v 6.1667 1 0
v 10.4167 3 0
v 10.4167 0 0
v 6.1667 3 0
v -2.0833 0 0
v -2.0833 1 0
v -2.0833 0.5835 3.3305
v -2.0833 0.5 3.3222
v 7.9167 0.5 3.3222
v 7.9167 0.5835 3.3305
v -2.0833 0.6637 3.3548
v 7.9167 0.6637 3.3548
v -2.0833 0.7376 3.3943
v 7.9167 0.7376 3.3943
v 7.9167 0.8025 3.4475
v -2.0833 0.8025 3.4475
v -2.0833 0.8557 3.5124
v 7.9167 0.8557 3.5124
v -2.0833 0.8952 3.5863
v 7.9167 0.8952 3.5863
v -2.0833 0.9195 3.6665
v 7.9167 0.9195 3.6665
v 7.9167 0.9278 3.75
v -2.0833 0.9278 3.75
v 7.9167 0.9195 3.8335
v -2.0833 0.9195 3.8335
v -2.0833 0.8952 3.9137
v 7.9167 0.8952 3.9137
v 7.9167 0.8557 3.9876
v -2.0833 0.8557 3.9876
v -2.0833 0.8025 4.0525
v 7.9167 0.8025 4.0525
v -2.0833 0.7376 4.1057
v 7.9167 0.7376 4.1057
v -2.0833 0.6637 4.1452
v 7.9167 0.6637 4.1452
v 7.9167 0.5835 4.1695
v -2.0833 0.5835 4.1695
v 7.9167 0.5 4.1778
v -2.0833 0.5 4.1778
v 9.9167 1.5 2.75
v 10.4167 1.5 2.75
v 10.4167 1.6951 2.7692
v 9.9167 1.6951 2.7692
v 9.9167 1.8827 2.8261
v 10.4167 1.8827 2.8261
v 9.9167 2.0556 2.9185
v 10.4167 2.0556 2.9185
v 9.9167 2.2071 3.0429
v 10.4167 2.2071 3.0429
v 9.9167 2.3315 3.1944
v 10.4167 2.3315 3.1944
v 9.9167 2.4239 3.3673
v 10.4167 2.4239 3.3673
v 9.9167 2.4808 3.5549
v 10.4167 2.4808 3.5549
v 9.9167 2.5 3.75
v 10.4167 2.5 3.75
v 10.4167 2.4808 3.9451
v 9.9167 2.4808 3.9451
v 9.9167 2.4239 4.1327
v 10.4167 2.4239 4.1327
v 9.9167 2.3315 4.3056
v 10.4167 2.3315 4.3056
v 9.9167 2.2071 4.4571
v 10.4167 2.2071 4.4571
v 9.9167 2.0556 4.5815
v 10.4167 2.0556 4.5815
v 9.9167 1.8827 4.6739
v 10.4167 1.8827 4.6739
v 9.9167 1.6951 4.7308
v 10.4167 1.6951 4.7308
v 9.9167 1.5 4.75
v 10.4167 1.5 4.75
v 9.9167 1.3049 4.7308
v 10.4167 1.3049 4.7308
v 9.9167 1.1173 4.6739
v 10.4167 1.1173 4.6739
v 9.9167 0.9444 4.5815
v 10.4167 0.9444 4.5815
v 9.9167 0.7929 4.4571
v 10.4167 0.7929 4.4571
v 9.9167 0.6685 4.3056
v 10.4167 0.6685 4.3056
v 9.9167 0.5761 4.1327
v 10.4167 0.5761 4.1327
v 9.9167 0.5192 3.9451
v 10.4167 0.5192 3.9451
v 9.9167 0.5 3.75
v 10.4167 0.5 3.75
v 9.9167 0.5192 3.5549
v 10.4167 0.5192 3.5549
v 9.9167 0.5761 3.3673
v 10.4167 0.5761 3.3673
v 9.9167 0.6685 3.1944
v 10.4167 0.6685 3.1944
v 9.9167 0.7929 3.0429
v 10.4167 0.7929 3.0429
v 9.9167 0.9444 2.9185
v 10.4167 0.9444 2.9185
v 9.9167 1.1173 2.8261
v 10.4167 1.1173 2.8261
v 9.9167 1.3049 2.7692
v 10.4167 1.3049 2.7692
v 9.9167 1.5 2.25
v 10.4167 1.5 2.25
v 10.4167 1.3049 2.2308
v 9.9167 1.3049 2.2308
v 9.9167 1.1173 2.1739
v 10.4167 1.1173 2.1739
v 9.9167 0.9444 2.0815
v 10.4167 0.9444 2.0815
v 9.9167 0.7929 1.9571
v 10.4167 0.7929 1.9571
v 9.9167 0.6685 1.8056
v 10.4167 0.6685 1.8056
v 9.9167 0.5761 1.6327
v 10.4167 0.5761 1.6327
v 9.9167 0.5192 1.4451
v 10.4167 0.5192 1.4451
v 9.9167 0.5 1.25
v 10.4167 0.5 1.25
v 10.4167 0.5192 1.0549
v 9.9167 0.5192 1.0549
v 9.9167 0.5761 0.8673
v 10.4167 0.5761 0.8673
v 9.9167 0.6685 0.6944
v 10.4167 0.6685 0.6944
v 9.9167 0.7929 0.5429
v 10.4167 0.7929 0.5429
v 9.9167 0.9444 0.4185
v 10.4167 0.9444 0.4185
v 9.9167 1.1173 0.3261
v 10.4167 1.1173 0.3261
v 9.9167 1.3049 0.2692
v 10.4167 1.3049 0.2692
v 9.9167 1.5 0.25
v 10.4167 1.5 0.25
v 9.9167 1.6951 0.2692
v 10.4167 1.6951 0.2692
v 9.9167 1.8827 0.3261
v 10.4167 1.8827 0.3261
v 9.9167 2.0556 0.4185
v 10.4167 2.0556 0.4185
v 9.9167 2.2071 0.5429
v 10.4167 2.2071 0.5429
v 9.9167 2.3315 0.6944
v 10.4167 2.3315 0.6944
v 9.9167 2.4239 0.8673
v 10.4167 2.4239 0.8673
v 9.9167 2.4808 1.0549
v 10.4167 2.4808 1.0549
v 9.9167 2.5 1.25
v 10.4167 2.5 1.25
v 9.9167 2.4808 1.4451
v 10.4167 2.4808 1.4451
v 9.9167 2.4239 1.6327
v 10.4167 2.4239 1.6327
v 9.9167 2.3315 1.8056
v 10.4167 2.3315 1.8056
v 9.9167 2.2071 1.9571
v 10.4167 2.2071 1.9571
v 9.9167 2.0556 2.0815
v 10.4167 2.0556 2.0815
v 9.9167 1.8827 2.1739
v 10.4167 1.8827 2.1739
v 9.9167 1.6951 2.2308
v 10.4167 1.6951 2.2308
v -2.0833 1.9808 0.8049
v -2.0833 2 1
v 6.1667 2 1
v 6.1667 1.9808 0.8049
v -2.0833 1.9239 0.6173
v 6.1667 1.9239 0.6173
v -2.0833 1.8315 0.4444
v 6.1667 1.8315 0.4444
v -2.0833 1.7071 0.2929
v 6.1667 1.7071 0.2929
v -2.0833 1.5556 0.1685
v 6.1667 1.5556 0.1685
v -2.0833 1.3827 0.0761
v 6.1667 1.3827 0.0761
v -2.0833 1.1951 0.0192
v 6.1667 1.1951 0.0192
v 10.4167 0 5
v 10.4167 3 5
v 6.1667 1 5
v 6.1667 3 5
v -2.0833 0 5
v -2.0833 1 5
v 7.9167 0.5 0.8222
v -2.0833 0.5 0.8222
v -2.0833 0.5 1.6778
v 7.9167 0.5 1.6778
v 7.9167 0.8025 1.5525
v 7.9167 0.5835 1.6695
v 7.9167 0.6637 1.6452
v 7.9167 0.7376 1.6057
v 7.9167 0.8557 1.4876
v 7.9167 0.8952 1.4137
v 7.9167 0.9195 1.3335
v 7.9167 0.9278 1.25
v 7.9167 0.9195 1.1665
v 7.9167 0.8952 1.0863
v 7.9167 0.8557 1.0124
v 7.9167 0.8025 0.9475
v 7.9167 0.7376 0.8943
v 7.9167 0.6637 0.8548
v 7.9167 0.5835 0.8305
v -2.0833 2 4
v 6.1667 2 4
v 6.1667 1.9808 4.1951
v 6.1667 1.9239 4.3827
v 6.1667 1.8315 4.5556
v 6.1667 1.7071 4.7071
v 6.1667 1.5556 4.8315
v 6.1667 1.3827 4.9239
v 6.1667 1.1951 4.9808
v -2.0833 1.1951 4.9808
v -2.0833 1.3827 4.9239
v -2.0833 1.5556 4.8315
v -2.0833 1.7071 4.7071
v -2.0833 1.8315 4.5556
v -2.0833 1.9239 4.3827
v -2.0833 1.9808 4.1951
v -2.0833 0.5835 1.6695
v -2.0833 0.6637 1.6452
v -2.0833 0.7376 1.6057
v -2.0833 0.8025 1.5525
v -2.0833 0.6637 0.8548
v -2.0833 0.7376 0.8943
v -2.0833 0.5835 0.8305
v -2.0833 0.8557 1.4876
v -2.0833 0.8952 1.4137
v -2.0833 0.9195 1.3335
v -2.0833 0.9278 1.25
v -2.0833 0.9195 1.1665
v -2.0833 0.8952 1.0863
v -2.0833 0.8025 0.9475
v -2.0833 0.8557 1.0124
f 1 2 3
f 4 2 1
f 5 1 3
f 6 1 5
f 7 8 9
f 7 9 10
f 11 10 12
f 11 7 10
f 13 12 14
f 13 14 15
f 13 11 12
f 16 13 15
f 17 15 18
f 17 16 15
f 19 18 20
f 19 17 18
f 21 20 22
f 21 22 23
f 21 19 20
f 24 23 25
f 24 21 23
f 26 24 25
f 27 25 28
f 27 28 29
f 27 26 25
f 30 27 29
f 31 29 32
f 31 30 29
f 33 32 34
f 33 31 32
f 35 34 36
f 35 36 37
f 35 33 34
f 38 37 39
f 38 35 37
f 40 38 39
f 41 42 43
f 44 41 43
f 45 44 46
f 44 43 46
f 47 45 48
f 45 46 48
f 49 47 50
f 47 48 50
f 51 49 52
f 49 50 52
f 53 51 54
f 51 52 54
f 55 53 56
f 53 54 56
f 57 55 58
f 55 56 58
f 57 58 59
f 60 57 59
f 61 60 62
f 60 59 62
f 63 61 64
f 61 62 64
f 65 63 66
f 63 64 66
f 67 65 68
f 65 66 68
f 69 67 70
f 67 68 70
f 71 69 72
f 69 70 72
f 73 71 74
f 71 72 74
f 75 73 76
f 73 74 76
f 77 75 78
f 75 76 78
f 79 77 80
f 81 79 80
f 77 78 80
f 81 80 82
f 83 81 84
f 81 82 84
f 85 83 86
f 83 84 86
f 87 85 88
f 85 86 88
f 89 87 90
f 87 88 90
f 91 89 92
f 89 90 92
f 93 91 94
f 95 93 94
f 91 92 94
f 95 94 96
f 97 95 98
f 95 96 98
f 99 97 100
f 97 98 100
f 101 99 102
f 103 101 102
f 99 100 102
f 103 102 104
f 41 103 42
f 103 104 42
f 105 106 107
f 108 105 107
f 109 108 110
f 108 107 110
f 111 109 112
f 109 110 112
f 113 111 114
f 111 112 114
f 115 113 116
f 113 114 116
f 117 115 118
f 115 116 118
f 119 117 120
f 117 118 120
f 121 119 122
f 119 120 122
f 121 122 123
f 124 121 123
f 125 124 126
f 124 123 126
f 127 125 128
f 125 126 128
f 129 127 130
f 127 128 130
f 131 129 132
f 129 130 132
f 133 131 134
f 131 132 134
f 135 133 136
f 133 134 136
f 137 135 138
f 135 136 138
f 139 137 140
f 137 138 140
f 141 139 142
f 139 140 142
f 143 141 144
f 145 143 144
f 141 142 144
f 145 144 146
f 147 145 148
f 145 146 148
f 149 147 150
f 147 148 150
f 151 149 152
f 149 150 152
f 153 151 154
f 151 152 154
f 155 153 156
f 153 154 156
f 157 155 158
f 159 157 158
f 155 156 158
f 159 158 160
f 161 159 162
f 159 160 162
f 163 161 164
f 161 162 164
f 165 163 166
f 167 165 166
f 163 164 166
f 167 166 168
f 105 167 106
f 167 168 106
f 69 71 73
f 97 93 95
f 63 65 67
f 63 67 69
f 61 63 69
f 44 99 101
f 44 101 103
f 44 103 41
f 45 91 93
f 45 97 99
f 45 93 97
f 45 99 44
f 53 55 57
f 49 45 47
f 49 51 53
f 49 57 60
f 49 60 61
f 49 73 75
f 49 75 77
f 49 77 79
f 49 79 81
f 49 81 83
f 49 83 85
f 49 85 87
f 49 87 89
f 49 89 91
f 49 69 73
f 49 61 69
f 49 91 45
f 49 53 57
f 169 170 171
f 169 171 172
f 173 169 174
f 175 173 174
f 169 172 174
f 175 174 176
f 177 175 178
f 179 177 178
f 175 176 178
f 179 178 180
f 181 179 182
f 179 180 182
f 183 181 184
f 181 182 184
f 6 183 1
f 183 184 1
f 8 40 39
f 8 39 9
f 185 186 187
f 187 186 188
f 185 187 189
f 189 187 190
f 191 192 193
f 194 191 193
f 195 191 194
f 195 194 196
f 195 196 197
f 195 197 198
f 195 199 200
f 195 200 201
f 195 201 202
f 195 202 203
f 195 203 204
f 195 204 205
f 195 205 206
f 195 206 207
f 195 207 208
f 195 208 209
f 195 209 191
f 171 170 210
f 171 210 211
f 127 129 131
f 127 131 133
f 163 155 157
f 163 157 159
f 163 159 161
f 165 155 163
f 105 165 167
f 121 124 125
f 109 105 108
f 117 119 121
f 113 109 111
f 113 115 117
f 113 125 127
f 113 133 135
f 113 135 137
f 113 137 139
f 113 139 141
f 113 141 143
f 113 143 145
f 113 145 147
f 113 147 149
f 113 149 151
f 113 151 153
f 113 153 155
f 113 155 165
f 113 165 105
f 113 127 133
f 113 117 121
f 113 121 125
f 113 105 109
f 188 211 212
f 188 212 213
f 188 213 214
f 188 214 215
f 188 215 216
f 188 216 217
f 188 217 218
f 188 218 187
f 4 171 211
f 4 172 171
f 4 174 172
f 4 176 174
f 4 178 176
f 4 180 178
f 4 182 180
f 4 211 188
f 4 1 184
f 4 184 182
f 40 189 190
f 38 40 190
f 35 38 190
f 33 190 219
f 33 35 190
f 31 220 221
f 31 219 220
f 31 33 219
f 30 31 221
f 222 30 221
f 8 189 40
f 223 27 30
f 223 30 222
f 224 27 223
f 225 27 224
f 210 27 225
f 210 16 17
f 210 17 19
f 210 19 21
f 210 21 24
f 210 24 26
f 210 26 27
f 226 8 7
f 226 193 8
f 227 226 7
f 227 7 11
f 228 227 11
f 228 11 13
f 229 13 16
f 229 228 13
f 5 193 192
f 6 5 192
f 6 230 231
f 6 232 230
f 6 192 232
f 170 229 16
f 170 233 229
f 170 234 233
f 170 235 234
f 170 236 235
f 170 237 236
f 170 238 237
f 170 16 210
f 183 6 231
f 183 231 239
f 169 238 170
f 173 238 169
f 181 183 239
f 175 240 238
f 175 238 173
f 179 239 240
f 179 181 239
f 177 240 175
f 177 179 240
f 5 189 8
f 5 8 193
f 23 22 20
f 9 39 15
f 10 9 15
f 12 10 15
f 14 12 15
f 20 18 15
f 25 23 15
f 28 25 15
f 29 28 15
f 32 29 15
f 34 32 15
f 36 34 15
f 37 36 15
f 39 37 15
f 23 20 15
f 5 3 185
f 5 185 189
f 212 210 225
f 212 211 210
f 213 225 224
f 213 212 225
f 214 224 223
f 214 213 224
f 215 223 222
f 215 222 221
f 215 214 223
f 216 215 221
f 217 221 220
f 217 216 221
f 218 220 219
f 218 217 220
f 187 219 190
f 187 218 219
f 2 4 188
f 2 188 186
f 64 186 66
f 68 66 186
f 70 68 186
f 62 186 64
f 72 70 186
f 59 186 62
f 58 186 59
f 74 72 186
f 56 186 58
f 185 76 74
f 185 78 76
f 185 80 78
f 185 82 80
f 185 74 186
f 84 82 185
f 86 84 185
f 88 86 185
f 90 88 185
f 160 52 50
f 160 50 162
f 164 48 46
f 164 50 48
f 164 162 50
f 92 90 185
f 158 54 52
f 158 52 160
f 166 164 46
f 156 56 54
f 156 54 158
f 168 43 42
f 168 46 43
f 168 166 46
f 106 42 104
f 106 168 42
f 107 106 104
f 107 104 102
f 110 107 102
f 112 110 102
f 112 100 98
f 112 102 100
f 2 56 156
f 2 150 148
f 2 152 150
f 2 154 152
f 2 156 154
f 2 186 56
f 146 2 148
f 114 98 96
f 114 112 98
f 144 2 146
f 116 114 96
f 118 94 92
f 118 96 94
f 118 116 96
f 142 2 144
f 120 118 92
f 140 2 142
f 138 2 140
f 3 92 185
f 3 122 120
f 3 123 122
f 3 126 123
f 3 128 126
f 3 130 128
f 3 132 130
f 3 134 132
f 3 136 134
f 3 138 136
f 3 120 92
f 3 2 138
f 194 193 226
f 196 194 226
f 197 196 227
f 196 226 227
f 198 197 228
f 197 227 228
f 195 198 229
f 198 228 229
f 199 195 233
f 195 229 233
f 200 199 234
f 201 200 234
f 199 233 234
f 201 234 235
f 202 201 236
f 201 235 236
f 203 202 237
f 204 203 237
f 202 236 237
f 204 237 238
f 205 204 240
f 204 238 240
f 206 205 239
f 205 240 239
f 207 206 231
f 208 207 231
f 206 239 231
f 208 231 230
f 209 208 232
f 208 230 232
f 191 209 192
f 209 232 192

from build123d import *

# Parameters (mm, degrees)
BOSS_EXTRUDE1_DEPTH = 5
FILLET4_R           = 1
CUT_EXTRUDE3_DEPTH  = 10
SKETCH5_R           = 1
CUT_EXTRUDE4_DEPTH  = 0.5


with BuildPart() as part:
    # Sketch1 → Boss-Extrude1 (new body)
    with BuildSketch(Plane.XY):
        Polygon((10.416666667, 3), (10.416666667, 0), (-2.083333333, 0), (-2.083333333, 2), (6.166666667, 2), (6.166666667, 3), align=None)
    extrude(amount=BOSS_EXTRUDE1_DEPTH)

    # Fillet4
    fillet4_edges = [part.edges().sort_by_distance(p)[0] for p in [
        (2.041666667, 2, 5),
        (2.041666667, 2, 0),
    ]]
    fillet(fillet4_edges, radius=FILLET4_R)

    # Sketch2 → Cut-Extrude3 (cut)
    with BuildSketch(Plane.ZY.offset(2.083333333)):
        with BuildLine():
            Line((4.177757267, 0.5), (3.322242733, 0.5))
            ThreePointArc((3.322242733, 0.5), (3.75, 0.927757267), (4.177757267, 0.5))
        make_face()
        with BuildLine():
            Line((0.822242733, 0.5), (1.677757267, 0.5))
            ThreePointArc((1.677757267, 0.5), (1.25, 0.927757267), (0.822242733, 0.5))
        make_face()
    extrude(amount=-CUT_EXTRUDE3_DEPTH, mode=Mode.SUBTRACT)

    # Sketch5 → Cut-Extrude4 (cut)
    with BuildSketch(Plane(origin=(10.416666667, 0, 0), x_dir=(0, 0, -1), z_dir=(1, 0, 0))):
        with Locations((-3.75, 1.5)):
            Circle(SKETCH5_R)
        with Locations(Location((-1.25, 1.5, 0), (0, 0, 180))):
            Circle(SKETCH5_R)
    extrude(amount=-CUT_EXTRUDE4_DEPTH, mode=Mode.SUBTRACT)


solid = part.part
